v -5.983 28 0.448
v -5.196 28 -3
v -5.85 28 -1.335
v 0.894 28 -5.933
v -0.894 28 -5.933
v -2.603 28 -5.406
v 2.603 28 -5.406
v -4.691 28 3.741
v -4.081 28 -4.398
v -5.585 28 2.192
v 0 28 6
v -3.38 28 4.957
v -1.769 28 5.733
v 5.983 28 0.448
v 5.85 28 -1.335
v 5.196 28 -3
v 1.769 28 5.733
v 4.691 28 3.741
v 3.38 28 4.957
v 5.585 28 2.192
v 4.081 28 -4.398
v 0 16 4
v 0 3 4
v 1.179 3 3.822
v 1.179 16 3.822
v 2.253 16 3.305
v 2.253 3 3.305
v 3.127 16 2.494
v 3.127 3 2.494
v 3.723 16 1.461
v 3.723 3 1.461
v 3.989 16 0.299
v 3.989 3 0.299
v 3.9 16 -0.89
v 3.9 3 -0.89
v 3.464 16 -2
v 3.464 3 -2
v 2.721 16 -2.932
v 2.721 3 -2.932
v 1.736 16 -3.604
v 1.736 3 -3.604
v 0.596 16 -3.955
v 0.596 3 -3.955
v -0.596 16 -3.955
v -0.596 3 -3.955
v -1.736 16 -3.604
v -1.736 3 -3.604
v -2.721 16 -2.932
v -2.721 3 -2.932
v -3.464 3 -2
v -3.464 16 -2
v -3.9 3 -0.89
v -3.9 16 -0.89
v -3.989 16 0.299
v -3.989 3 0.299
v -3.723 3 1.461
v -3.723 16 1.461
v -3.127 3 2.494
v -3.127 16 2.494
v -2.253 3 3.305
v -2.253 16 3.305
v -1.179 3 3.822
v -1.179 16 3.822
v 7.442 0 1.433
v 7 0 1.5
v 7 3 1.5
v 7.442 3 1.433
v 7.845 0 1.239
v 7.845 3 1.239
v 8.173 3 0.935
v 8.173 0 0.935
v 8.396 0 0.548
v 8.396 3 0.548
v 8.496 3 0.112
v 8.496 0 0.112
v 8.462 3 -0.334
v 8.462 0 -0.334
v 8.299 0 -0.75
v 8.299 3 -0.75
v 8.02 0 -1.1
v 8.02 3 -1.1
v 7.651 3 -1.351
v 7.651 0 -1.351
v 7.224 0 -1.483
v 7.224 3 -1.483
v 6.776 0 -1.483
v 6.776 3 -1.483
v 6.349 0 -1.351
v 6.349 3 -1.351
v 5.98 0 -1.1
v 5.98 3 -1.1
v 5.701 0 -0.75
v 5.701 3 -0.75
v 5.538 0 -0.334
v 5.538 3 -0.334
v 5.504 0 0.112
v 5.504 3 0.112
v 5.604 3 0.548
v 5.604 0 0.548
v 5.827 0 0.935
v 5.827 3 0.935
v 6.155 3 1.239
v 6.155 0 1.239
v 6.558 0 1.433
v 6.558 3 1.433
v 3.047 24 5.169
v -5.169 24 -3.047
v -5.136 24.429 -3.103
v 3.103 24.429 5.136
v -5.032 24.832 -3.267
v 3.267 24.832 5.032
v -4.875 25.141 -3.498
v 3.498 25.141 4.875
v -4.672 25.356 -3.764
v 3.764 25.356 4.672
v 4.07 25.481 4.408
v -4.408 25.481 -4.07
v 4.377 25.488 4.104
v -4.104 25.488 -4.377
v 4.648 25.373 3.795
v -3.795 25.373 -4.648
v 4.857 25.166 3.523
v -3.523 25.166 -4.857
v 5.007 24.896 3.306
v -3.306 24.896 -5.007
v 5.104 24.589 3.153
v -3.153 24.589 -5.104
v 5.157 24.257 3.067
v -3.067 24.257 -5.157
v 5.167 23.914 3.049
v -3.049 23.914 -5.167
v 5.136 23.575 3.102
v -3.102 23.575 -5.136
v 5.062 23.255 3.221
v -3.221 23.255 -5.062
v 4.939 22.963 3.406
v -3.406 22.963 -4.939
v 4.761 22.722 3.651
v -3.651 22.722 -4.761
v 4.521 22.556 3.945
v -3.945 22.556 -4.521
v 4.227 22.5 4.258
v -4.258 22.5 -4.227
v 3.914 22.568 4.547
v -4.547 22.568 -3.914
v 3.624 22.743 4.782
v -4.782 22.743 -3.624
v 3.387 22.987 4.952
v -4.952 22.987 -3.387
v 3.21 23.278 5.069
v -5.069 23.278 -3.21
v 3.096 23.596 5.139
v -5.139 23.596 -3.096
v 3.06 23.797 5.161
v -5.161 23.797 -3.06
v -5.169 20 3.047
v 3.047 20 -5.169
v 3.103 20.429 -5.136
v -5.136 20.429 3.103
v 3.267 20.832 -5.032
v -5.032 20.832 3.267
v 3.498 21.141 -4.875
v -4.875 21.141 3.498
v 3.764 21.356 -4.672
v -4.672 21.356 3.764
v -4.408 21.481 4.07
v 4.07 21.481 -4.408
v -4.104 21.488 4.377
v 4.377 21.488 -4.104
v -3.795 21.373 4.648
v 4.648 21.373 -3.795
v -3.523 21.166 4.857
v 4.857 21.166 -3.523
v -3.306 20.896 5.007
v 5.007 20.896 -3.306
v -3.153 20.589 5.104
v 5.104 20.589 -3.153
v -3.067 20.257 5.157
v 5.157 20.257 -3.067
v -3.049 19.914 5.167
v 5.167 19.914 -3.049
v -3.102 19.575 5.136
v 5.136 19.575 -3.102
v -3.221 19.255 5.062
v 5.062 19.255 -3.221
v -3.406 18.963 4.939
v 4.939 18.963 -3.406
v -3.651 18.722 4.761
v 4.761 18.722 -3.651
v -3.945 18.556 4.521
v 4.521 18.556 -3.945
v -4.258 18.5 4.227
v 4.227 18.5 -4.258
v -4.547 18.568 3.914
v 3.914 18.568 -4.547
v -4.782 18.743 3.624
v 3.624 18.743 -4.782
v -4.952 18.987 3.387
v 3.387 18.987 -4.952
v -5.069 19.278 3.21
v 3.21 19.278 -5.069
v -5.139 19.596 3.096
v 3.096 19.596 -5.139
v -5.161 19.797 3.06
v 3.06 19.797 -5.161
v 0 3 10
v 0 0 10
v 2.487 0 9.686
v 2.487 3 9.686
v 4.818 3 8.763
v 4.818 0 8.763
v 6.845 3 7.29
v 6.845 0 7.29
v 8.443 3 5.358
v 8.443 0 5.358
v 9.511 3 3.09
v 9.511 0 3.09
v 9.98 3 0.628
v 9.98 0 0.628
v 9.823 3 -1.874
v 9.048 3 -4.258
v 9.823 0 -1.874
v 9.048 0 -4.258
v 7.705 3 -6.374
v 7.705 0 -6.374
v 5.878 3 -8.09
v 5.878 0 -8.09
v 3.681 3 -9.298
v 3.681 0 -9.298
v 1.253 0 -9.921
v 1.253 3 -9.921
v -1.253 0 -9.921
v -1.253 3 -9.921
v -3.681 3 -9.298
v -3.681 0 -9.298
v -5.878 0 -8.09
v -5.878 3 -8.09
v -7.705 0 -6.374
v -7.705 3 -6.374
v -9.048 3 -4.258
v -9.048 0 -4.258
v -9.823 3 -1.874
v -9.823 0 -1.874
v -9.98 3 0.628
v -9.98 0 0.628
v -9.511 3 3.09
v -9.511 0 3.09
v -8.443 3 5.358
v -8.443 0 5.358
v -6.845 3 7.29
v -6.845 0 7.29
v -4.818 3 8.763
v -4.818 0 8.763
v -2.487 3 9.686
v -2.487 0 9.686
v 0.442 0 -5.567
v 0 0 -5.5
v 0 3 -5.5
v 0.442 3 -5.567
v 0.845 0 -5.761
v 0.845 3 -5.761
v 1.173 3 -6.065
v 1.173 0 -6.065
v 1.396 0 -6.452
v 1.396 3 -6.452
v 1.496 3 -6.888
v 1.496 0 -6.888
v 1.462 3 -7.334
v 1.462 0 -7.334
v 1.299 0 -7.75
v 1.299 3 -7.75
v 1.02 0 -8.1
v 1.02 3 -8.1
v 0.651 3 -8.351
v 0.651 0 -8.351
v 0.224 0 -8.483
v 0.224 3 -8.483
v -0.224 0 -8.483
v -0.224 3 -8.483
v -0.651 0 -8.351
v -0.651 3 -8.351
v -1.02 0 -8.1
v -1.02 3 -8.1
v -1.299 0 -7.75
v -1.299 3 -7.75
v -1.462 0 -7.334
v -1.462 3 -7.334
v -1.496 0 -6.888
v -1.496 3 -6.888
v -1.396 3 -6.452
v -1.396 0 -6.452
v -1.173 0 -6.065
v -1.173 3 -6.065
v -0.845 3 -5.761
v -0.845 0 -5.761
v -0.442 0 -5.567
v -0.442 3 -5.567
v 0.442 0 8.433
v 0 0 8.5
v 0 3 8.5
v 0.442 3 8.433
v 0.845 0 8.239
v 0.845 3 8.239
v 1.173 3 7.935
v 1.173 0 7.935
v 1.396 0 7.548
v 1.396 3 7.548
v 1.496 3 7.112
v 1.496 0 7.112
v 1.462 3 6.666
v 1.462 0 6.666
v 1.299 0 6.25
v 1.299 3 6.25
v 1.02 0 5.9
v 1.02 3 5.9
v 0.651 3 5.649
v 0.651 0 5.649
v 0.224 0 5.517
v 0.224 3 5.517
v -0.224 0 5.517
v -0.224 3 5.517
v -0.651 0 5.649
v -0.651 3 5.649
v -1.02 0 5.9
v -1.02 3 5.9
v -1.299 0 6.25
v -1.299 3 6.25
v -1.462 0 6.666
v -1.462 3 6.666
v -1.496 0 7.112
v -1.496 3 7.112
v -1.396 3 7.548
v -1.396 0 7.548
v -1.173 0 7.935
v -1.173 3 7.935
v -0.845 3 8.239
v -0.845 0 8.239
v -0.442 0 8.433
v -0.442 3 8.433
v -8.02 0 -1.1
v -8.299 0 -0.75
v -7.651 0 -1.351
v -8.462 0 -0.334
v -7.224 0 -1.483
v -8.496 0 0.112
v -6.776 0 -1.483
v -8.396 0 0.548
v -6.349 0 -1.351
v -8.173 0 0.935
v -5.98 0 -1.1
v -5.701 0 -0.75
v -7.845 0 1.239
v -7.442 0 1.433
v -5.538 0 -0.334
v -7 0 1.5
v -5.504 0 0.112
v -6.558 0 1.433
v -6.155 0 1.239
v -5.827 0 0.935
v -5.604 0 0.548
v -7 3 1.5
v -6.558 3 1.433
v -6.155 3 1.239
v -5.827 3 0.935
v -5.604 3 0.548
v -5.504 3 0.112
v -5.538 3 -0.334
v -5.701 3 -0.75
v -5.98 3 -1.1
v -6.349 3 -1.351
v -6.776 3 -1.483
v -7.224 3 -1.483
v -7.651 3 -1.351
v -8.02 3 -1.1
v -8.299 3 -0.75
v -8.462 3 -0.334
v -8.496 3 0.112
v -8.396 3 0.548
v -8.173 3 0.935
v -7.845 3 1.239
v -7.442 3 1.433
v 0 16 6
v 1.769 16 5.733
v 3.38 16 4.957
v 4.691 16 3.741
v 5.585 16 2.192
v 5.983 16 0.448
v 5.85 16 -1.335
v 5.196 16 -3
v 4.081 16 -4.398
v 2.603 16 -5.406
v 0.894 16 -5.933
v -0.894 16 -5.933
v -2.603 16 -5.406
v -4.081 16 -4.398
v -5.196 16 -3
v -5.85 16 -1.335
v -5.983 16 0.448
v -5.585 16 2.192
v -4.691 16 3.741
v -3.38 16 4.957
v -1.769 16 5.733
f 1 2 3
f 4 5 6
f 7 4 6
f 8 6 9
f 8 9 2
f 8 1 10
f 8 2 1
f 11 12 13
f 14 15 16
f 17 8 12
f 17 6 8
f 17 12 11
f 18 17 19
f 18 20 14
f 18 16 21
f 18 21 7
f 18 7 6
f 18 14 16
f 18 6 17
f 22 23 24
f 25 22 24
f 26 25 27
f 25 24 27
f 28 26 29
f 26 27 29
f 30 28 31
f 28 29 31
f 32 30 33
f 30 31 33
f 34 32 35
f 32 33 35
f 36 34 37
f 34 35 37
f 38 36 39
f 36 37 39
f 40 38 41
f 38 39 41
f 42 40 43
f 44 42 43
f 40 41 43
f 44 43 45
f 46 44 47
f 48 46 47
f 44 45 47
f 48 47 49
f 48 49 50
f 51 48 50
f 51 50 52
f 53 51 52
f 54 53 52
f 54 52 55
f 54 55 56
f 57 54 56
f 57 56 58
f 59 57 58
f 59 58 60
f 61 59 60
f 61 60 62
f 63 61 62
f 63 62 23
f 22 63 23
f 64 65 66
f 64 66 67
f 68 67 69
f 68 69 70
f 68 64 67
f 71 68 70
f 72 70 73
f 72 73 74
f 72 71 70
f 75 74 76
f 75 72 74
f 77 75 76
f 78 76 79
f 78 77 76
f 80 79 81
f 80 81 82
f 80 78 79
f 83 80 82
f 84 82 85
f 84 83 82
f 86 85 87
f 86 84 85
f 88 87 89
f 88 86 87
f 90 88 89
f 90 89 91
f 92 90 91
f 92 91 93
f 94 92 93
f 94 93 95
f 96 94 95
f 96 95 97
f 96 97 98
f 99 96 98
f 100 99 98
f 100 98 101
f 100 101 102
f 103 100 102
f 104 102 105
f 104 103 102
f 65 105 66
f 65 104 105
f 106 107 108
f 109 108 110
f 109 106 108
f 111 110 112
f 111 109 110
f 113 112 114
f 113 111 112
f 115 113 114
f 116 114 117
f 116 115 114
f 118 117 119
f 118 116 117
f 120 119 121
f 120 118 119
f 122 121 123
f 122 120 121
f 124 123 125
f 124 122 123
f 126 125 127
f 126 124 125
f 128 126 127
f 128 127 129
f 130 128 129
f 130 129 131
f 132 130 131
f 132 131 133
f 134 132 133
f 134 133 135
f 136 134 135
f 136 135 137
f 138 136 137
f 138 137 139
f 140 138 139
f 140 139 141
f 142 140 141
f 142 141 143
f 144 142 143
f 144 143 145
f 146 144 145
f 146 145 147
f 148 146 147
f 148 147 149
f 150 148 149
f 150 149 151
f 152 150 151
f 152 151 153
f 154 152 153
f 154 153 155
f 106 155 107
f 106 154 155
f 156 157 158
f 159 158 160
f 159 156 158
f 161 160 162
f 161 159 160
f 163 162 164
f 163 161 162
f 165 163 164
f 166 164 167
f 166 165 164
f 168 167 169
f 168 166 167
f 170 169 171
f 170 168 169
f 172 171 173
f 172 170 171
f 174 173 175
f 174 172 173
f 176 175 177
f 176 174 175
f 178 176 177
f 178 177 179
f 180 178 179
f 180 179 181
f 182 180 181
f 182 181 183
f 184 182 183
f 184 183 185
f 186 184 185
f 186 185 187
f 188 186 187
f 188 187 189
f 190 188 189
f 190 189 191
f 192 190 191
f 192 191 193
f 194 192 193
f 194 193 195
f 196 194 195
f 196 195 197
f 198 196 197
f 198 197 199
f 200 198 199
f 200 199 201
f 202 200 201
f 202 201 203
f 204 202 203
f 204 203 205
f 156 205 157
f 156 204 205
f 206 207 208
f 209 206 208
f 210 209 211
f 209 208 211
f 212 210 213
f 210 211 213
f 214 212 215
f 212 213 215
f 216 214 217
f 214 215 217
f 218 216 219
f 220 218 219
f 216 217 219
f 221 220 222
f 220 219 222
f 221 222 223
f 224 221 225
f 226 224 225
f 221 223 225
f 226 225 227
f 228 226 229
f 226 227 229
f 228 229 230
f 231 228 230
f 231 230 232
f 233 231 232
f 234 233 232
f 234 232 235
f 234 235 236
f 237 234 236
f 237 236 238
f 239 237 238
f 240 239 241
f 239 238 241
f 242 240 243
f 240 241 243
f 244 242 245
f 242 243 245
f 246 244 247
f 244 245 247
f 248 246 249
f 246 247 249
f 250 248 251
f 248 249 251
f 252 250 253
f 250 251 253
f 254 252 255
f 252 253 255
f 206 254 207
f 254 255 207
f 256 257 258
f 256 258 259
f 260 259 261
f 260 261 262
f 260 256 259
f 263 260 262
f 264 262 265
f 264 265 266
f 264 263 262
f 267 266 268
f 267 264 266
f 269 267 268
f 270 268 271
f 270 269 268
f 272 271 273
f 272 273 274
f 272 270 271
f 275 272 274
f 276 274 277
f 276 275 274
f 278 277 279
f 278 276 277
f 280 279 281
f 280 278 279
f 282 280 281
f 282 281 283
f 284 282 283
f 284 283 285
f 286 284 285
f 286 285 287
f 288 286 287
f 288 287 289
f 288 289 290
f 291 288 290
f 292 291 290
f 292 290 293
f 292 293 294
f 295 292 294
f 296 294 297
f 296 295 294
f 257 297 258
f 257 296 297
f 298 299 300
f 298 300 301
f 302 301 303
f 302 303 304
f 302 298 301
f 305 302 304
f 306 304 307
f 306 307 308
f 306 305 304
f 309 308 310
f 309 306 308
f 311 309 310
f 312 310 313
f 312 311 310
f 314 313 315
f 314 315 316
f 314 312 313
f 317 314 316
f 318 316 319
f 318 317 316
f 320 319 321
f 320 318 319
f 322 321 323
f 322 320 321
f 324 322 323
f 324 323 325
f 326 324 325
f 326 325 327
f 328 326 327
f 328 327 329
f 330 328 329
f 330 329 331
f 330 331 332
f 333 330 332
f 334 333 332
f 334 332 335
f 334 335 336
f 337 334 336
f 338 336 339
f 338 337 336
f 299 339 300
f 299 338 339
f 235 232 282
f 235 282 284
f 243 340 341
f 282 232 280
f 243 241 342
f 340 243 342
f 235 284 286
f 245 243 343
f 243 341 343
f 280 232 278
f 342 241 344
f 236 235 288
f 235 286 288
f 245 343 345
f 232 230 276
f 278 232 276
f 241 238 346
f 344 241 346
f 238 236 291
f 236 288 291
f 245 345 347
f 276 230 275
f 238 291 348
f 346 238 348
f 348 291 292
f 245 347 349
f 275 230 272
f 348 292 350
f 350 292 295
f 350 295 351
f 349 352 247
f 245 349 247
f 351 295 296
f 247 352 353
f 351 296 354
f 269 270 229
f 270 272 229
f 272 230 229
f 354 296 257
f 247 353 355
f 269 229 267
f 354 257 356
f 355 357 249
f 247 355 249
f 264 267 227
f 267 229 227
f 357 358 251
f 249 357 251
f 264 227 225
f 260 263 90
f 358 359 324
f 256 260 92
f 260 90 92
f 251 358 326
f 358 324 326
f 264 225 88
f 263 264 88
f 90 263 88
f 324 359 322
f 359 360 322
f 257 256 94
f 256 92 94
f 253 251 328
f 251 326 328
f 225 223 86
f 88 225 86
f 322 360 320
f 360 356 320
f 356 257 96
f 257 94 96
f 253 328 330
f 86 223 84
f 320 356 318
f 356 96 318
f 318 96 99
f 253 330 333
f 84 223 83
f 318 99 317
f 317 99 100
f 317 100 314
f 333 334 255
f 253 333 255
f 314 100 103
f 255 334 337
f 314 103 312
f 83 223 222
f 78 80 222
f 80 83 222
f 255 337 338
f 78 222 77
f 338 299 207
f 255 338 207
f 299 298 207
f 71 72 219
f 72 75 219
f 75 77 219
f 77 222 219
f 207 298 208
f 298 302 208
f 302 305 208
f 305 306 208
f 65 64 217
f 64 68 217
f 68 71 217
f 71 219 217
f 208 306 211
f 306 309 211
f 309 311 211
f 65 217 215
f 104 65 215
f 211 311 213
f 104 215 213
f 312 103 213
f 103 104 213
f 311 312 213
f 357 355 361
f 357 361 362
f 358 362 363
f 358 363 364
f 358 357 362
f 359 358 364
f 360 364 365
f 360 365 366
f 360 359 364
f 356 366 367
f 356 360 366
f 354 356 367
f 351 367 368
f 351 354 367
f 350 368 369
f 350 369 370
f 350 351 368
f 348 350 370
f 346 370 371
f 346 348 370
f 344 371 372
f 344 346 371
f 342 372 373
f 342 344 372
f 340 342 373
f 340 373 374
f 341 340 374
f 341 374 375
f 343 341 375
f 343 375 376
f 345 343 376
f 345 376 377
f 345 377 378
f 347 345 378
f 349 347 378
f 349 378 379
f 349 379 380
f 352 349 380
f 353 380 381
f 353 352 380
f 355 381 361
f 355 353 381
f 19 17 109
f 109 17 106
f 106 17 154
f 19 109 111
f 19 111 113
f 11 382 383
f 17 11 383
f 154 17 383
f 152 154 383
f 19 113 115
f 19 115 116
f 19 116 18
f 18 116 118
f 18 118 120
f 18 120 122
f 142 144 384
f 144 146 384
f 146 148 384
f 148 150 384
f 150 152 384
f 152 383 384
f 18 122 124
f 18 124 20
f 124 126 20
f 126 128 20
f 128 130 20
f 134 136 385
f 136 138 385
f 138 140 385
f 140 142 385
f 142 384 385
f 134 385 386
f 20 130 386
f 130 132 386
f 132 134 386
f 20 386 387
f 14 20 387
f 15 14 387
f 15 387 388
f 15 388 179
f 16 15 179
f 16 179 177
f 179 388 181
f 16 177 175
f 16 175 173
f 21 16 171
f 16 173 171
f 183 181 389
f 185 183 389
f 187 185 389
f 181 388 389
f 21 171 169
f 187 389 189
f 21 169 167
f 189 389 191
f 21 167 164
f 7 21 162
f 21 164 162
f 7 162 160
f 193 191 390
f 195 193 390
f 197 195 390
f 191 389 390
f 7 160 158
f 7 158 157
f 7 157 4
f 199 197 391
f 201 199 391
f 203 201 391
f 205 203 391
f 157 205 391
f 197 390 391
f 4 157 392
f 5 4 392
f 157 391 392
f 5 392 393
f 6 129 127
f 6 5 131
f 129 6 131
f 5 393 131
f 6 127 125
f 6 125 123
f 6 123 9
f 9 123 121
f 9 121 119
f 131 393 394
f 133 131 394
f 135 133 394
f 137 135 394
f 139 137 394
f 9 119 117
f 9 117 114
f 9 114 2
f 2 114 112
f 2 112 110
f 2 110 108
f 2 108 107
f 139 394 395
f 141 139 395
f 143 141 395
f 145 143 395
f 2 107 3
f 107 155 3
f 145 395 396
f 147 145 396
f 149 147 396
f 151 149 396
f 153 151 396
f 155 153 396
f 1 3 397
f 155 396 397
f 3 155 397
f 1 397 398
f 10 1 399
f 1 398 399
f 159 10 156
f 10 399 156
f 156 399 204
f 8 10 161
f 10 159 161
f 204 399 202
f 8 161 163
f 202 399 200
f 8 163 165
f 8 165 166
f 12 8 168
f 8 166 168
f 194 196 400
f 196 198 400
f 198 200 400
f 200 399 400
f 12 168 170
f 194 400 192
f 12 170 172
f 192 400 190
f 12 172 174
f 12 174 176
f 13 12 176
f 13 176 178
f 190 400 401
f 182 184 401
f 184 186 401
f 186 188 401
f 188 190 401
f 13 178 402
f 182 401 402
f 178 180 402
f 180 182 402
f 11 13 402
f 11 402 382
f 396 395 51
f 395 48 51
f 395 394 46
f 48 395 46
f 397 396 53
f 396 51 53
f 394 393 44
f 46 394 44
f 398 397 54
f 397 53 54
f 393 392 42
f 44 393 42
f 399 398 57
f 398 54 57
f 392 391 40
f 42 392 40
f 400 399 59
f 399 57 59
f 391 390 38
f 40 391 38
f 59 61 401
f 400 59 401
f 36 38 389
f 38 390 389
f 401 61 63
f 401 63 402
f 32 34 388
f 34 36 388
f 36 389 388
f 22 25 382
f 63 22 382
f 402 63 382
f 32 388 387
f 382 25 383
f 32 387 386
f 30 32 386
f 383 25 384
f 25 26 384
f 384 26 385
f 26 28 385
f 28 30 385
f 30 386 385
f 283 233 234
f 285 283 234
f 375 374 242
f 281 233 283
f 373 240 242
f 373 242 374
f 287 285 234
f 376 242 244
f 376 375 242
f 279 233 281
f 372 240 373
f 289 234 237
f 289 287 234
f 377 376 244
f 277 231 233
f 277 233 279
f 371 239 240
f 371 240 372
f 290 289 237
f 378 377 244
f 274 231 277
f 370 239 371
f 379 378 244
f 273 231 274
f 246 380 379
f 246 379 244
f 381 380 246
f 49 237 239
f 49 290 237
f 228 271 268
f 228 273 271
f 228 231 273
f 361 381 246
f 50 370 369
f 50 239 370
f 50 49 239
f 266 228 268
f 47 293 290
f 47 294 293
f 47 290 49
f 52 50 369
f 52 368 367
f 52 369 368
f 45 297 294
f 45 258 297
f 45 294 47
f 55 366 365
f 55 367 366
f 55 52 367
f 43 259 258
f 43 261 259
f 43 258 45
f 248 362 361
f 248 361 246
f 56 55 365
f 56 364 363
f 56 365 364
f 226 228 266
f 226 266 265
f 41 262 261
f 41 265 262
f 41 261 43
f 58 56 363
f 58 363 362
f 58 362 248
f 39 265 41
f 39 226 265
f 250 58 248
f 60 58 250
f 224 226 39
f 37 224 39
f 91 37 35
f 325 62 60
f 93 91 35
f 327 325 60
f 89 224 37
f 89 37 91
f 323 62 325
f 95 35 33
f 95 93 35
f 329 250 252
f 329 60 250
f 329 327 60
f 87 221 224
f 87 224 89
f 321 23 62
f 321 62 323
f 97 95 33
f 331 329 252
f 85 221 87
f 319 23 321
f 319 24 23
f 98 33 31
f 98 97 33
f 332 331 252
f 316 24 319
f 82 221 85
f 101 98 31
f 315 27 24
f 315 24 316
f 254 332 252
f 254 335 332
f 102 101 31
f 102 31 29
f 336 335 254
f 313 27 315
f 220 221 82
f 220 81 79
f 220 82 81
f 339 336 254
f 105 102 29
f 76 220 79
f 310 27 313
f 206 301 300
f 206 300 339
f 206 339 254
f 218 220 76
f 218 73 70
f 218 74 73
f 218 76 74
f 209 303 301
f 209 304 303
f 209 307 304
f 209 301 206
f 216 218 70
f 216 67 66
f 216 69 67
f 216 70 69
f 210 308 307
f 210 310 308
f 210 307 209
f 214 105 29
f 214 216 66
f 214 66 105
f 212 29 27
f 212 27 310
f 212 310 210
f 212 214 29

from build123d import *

# Parameters (mm, degrees)
SKETCH_1_R               = 10
SKETCH_1_R_2             = 3
SKETCH_1_R_3             = 1.5
EXTRUDE_1_DEPTH          = 3
SKETCH_2_R               = 4
EXTRUDE_2_DEPTH          = 16
SKETCH_6_R               = 6
EXTRUDE_3_DEPTH          = 12
CUT_EXTRUDE_1_DEPTH      = 32.368774283
CUT_EXTRUDE_1_DEPTH_BACK = 32.368774283
SKETCH_5_R               = 1.5
CUT_EXTRUDE_3_DEPTH      = 32.368774372
CUT_EXTRUDE_3_DEPTH_BACK = 32.368774372
SKETCH_7_R               = 1.5


with BuildPart() as part:
    # 草图1 → 凸台-拉伸1 (new body)
    with BuildSketch(Plane(origin=(0, 0, 0), x_dir=(1, 0, 0), z_dir=(0, 1, 0))):
        Circle(SKETCH_1_R)
        Circle(SKETCH_1_R_2, mode=Mode.SUBTRACT)
        with Locations((0, 7)):
            Circle(SKETCH_1_R_3, mode=Mode.SUBTRACT)
        with Locations((7, 0)):
            Circle(SKETCH_1_R_3, mode=Mode.SUBTRACT)
        with Locations((0, -7)):
            Circle(SKETCH_1_R_3, mode=Mode.SUBTRACT)
        with Locations((-7, 0)):
            Circle(SKETCH_1_R_3, mode=Mode.SUBTRACT)
    extrude(amount=EXTRUDE_1_DEPTH)

    # 草图2 → 凸台-拉伸2 (add)
    with BuildSketch(Plane(origin=(0, 0, 0), x_dir=(1, 0, 0), z_dir=(0, 1, 0))):
        Circle(SKETCH_2_R)
    extrude(amount=EXTRUDE_2_DEPTH)

    # 草图6 → 凸台-拉伸3 (add)
    with BuildSketch(Plane(origin=(0, 16, 0), x_dir=(1, 0, 0), z_dir=(0, 1, 0))):
        Circle(SKETCH_6_R)
    extrude(amount=EXTRUDE_3_DEPTH)

    # 草图5 → 切除-拉伸1 (cut, two sides: drawn at the far end of the back side and taken through both)
    with BuildSketch(Plane(origin=(0, 0, 0), x_dir=(0, 1, 0), z_dir=(0.7071067811865438, 0, -0.7071067811865512)).offset(-CUT_EXTRUDE_1_DEPTH_BACK)):
        with Locations((20, 0)):
            Circle(SKETCH_5_R)
    extrude(amount=CUT_EXTRUDE_1_DEPTH + CUT_EXTRUDE_1_DEPTH_BACK, mode=Mode.SUBTRACT)

    # 草图7 → 切除-拉伸3 (cut, two sides: drawn at the far end of the back side and taken through both)
    with BuildSketch(Plane(origin=(0, 0, 0), x_dir=(0, 1, 0), z_dir=(-0.7071067811865537, 0, -0.7071067811865414)).offset(-CUT_EXTRUDE_3_DEPTH_BACK)):
        with Locations((24, 0)):
            Circle(SKETCH_7_R)
    extrude(amount=CUT_EXTRUDE_3_DEPTH + CUT_EXTRUDE_3_DEPTH_BACK, mode=Mode.SUBTRACT)


solid = part.part
